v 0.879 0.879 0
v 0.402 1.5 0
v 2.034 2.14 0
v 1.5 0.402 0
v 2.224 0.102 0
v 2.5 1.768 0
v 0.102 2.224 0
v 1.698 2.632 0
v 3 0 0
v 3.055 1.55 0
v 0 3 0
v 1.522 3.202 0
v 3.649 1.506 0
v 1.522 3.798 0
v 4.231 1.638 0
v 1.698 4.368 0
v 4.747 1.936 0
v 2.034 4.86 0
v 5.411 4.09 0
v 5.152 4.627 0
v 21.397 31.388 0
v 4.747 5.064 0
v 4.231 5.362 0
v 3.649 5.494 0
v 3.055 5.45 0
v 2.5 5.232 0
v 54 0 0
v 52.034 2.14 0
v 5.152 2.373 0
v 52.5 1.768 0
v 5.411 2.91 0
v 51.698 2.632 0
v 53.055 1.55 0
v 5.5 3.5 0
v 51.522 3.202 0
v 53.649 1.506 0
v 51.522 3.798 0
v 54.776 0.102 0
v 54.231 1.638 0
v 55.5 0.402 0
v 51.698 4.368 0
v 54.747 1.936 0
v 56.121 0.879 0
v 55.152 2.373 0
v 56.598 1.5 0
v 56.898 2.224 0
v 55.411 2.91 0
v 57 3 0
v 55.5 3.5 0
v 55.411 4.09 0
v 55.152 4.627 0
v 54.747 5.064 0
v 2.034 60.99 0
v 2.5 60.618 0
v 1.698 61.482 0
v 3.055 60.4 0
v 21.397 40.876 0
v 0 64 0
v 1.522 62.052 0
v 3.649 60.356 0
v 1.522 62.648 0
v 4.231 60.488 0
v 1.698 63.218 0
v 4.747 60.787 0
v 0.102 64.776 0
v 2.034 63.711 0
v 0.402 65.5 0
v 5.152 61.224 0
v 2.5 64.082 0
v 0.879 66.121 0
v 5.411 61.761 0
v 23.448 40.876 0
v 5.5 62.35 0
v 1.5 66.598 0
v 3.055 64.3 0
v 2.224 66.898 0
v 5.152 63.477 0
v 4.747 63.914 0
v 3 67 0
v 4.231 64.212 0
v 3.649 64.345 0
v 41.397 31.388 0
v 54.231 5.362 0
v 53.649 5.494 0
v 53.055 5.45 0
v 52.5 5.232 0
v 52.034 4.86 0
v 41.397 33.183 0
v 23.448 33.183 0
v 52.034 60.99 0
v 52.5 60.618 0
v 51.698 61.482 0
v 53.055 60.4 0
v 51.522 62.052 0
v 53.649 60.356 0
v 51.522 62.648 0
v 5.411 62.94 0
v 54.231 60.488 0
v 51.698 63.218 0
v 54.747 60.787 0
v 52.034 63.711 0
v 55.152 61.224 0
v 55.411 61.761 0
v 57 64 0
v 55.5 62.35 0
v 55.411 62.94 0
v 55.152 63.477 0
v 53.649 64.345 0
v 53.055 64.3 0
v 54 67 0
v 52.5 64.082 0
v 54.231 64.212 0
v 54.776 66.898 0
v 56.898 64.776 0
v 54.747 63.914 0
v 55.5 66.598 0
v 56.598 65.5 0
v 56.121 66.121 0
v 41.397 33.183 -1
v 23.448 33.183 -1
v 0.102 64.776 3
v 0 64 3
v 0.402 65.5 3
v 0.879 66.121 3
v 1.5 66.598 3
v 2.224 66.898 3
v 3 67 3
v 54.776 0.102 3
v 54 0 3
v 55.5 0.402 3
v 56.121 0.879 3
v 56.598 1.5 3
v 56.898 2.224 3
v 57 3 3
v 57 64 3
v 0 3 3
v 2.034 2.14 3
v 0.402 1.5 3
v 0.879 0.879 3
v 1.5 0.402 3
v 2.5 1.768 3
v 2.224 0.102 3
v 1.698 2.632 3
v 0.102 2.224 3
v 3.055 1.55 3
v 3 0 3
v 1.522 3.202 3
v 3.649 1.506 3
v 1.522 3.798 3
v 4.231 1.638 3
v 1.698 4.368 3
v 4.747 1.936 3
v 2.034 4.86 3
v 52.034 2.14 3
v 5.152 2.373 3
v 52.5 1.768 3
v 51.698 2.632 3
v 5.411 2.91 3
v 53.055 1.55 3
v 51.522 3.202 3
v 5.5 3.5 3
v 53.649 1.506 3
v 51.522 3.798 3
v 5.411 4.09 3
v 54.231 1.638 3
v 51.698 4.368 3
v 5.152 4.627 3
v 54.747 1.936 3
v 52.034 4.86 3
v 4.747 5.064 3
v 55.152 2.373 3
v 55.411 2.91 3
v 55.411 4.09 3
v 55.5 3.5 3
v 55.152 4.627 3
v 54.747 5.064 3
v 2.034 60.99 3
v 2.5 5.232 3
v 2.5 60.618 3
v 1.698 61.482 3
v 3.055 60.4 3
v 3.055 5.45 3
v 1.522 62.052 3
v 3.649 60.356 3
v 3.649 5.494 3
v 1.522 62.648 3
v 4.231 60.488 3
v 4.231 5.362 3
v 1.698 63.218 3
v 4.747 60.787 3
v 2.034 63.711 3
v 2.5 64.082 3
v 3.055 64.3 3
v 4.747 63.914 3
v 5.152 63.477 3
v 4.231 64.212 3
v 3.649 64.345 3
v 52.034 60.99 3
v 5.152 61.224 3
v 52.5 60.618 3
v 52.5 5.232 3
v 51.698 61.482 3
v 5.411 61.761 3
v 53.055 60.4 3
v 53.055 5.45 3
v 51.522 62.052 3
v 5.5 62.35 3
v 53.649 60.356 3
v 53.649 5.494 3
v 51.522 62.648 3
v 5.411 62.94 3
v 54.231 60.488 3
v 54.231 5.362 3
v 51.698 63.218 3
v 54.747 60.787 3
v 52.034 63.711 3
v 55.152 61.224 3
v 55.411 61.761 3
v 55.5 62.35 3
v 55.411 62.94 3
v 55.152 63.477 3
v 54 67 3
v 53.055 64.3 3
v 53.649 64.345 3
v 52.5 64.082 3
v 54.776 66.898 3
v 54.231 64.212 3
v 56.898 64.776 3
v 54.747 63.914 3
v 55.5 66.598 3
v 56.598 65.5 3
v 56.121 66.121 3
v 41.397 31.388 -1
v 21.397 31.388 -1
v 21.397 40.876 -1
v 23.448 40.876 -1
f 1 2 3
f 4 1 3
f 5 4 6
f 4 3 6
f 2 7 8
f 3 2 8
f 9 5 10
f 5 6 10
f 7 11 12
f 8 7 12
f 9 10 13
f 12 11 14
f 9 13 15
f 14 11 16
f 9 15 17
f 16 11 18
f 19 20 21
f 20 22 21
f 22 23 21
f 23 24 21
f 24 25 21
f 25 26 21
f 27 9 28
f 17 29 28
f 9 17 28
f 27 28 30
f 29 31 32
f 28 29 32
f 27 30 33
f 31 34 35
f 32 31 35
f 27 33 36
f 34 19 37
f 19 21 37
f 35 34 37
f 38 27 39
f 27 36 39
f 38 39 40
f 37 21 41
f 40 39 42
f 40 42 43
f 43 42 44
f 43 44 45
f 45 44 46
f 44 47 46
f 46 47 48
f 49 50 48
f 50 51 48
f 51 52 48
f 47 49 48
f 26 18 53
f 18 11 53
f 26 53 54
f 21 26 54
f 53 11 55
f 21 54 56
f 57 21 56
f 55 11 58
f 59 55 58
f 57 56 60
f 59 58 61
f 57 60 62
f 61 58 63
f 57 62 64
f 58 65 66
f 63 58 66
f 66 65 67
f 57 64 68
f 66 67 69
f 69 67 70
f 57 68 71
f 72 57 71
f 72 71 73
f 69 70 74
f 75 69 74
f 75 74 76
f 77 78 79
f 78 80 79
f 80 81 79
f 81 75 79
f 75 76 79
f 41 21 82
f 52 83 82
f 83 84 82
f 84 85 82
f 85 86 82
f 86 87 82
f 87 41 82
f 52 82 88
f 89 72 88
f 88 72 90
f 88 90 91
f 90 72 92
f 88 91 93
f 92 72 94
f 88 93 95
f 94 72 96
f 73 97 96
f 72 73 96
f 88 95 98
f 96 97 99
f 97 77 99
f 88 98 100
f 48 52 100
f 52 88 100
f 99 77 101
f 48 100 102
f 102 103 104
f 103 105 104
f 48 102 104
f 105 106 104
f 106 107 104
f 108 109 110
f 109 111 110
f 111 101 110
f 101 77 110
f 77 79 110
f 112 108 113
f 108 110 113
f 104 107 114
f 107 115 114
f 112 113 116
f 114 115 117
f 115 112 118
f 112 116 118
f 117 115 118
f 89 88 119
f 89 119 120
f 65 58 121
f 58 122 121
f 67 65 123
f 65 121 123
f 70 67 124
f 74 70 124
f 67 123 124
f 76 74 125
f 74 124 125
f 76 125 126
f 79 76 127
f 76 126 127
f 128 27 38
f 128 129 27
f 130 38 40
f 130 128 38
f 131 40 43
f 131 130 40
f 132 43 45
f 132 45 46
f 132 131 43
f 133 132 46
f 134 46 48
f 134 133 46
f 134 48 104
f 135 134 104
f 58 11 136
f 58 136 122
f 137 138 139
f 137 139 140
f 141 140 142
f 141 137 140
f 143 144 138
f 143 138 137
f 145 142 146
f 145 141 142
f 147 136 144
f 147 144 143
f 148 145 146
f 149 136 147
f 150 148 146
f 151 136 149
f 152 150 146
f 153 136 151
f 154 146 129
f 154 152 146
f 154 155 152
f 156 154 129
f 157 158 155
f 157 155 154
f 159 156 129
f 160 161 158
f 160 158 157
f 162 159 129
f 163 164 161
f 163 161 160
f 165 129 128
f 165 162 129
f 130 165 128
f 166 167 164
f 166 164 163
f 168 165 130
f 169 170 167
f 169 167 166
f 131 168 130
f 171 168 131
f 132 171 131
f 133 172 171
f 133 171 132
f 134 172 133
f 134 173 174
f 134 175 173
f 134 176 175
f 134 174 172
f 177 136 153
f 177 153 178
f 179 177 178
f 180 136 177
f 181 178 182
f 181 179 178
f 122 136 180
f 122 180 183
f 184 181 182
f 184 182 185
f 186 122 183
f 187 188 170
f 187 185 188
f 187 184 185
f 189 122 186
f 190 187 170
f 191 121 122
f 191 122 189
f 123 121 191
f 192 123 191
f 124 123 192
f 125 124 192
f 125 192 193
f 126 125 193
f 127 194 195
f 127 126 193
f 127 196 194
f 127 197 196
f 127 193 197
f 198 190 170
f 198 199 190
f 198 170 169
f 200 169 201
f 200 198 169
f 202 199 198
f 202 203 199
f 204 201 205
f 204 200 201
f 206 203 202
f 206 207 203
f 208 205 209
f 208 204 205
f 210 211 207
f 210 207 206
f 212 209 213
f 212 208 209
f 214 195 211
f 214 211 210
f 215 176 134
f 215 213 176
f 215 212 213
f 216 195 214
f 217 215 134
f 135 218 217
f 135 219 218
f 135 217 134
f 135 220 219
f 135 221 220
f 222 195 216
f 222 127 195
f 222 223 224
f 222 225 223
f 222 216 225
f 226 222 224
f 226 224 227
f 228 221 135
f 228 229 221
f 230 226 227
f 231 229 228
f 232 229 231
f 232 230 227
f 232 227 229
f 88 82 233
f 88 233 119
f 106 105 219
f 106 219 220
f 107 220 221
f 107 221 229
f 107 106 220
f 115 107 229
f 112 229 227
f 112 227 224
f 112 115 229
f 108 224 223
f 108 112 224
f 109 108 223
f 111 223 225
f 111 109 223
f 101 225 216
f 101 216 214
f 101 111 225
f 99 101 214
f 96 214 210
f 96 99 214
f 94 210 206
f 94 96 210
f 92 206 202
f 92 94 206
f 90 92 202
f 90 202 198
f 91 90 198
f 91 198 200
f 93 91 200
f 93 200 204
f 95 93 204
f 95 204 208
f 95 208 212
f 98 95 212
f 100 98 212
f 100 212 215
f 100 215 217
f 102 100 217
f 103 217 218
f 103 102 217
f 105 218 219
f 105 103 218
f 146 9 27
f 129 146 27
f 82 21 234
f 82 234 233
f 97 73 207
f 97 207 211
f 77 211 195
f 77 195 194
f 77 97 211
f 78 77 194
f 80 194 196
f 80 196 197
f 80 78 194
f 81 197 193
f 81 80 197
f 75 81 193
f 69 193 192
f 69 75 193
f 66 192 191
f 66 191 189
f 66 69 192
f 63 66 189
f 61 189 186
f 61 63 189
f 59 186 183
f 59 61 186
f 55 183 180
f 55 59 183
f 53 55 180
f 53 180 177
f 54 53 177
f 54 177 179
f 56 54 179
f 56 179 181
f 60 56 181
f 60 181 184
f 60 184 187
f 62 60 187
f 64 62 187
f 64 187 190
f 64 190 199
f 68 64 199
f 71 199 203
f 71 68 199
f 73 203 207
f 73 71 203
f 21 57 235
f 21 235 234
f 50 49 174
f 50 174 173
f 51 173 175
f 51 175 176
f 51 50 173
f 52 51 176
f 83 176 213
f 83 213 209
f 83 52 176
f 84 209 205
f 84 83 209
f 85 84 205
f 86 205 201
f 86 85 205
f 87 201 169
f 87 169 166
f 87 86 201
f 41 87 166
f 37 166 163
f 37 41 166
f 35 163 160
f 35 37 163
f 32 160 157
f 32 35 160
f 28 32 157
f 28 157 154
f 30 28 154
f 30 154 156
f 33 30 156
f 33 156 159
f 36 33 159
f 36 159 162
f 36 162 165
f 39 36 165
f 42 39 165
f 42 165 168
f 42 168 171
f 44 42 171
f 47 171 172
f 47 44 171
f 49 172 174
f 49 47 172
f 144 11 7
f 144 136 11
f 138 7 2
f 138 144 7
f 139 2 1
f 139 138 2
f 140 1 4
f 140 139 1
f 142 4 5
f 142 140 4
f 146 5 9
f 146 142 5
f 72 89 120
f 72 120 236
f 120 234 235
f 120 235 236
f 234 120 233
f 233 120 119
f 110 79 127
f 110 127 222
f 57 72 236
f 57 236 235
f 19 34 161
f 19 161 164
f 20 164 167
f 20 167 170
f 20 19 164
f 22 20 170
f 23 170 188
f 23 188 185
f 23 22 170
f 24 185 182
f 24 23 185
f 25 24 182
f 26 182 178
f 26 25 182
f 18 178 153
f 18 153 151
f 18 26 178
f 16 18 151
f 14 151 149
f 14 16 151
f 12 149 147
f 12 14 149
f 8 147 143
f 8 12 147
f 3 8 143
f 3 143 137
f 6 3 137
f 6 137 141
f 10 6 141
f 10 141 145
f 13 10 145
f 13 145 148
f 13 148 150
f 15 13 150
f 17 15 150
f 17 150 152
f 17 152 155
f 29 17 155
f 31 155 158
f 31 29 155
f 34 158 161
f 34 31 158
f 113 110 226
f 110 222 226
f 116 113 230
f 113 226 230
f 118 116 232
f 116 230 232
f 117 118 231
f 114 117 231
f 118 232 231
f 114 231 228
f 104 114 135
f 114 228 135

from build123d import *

# Parameters (mm, degrees)
SKICA1_W                = 57
SKICA1_H                = 67
SKICA1_R                = 2
P_IDAT_VYSUNUT_M1_DEPTH = 3
P_IDAT_VYSUNUT_M2_DEPTH = 1
ZAOBLIT1_R              = 3


with BuildPart() as part:
    # Skica1 → Přidat vysunutím1 (new body)
    with BuildSketch(Plane.XY):
        with Locations((28.5, 33.5)):
            Rectangle(SKICA1_W, SKICA1_H)
        with Locations((3.5, 62.35016579)):
            Circle(SKICA1_R, mode=Mode.SUBTRACT)
        with Locations((53.5, 62.35016579)):
            Circle(SKICA1_R, mode=Mode.SUBTRACT)
        with Locations((53.5, 3.5)):
            Circle(SKICA1_R, mode=Mode.SUBTRACT)
        with Locations((3.5, 3.5)):
            Circle(SKICA1_R, mode=Mode.SUBTRACT)
    extrude(amount=P_IDAT_VYSUNUT_M1_DEPTH)

    # Skica2 → Přidat vysunutím2 (add)
    with BuildSketch(Plane(origin=(0, 0, 0), x_dir=(-1, 0, 0), z_dir=(0, 0, -1))):
        Polygon((-41.396588298, 31.388427372), (-41.396588298, 33.183299167), (-23.447870349, 33.183299167), (-23.447870349, 40.87560686), (-21.396588298, 40.87560686), (-21.396588298, 31.388427372), align=None)
    extrude(amount=P_IDAT_VYSUNUT_M2_DEPTH)

    # Zaoblit1
    zaoblit1_edges = [part.edges().sort_by_distance(p)[0] for p in [
        (0, 67, 1.5),
        (57, 67, 1.5),
        (57, 0, 1.5),
        (0, 0, 1.5),
    ]]
    fillet(zaoblit1_edges, radius=ZAOBLIT1_R)


solid = part.part
